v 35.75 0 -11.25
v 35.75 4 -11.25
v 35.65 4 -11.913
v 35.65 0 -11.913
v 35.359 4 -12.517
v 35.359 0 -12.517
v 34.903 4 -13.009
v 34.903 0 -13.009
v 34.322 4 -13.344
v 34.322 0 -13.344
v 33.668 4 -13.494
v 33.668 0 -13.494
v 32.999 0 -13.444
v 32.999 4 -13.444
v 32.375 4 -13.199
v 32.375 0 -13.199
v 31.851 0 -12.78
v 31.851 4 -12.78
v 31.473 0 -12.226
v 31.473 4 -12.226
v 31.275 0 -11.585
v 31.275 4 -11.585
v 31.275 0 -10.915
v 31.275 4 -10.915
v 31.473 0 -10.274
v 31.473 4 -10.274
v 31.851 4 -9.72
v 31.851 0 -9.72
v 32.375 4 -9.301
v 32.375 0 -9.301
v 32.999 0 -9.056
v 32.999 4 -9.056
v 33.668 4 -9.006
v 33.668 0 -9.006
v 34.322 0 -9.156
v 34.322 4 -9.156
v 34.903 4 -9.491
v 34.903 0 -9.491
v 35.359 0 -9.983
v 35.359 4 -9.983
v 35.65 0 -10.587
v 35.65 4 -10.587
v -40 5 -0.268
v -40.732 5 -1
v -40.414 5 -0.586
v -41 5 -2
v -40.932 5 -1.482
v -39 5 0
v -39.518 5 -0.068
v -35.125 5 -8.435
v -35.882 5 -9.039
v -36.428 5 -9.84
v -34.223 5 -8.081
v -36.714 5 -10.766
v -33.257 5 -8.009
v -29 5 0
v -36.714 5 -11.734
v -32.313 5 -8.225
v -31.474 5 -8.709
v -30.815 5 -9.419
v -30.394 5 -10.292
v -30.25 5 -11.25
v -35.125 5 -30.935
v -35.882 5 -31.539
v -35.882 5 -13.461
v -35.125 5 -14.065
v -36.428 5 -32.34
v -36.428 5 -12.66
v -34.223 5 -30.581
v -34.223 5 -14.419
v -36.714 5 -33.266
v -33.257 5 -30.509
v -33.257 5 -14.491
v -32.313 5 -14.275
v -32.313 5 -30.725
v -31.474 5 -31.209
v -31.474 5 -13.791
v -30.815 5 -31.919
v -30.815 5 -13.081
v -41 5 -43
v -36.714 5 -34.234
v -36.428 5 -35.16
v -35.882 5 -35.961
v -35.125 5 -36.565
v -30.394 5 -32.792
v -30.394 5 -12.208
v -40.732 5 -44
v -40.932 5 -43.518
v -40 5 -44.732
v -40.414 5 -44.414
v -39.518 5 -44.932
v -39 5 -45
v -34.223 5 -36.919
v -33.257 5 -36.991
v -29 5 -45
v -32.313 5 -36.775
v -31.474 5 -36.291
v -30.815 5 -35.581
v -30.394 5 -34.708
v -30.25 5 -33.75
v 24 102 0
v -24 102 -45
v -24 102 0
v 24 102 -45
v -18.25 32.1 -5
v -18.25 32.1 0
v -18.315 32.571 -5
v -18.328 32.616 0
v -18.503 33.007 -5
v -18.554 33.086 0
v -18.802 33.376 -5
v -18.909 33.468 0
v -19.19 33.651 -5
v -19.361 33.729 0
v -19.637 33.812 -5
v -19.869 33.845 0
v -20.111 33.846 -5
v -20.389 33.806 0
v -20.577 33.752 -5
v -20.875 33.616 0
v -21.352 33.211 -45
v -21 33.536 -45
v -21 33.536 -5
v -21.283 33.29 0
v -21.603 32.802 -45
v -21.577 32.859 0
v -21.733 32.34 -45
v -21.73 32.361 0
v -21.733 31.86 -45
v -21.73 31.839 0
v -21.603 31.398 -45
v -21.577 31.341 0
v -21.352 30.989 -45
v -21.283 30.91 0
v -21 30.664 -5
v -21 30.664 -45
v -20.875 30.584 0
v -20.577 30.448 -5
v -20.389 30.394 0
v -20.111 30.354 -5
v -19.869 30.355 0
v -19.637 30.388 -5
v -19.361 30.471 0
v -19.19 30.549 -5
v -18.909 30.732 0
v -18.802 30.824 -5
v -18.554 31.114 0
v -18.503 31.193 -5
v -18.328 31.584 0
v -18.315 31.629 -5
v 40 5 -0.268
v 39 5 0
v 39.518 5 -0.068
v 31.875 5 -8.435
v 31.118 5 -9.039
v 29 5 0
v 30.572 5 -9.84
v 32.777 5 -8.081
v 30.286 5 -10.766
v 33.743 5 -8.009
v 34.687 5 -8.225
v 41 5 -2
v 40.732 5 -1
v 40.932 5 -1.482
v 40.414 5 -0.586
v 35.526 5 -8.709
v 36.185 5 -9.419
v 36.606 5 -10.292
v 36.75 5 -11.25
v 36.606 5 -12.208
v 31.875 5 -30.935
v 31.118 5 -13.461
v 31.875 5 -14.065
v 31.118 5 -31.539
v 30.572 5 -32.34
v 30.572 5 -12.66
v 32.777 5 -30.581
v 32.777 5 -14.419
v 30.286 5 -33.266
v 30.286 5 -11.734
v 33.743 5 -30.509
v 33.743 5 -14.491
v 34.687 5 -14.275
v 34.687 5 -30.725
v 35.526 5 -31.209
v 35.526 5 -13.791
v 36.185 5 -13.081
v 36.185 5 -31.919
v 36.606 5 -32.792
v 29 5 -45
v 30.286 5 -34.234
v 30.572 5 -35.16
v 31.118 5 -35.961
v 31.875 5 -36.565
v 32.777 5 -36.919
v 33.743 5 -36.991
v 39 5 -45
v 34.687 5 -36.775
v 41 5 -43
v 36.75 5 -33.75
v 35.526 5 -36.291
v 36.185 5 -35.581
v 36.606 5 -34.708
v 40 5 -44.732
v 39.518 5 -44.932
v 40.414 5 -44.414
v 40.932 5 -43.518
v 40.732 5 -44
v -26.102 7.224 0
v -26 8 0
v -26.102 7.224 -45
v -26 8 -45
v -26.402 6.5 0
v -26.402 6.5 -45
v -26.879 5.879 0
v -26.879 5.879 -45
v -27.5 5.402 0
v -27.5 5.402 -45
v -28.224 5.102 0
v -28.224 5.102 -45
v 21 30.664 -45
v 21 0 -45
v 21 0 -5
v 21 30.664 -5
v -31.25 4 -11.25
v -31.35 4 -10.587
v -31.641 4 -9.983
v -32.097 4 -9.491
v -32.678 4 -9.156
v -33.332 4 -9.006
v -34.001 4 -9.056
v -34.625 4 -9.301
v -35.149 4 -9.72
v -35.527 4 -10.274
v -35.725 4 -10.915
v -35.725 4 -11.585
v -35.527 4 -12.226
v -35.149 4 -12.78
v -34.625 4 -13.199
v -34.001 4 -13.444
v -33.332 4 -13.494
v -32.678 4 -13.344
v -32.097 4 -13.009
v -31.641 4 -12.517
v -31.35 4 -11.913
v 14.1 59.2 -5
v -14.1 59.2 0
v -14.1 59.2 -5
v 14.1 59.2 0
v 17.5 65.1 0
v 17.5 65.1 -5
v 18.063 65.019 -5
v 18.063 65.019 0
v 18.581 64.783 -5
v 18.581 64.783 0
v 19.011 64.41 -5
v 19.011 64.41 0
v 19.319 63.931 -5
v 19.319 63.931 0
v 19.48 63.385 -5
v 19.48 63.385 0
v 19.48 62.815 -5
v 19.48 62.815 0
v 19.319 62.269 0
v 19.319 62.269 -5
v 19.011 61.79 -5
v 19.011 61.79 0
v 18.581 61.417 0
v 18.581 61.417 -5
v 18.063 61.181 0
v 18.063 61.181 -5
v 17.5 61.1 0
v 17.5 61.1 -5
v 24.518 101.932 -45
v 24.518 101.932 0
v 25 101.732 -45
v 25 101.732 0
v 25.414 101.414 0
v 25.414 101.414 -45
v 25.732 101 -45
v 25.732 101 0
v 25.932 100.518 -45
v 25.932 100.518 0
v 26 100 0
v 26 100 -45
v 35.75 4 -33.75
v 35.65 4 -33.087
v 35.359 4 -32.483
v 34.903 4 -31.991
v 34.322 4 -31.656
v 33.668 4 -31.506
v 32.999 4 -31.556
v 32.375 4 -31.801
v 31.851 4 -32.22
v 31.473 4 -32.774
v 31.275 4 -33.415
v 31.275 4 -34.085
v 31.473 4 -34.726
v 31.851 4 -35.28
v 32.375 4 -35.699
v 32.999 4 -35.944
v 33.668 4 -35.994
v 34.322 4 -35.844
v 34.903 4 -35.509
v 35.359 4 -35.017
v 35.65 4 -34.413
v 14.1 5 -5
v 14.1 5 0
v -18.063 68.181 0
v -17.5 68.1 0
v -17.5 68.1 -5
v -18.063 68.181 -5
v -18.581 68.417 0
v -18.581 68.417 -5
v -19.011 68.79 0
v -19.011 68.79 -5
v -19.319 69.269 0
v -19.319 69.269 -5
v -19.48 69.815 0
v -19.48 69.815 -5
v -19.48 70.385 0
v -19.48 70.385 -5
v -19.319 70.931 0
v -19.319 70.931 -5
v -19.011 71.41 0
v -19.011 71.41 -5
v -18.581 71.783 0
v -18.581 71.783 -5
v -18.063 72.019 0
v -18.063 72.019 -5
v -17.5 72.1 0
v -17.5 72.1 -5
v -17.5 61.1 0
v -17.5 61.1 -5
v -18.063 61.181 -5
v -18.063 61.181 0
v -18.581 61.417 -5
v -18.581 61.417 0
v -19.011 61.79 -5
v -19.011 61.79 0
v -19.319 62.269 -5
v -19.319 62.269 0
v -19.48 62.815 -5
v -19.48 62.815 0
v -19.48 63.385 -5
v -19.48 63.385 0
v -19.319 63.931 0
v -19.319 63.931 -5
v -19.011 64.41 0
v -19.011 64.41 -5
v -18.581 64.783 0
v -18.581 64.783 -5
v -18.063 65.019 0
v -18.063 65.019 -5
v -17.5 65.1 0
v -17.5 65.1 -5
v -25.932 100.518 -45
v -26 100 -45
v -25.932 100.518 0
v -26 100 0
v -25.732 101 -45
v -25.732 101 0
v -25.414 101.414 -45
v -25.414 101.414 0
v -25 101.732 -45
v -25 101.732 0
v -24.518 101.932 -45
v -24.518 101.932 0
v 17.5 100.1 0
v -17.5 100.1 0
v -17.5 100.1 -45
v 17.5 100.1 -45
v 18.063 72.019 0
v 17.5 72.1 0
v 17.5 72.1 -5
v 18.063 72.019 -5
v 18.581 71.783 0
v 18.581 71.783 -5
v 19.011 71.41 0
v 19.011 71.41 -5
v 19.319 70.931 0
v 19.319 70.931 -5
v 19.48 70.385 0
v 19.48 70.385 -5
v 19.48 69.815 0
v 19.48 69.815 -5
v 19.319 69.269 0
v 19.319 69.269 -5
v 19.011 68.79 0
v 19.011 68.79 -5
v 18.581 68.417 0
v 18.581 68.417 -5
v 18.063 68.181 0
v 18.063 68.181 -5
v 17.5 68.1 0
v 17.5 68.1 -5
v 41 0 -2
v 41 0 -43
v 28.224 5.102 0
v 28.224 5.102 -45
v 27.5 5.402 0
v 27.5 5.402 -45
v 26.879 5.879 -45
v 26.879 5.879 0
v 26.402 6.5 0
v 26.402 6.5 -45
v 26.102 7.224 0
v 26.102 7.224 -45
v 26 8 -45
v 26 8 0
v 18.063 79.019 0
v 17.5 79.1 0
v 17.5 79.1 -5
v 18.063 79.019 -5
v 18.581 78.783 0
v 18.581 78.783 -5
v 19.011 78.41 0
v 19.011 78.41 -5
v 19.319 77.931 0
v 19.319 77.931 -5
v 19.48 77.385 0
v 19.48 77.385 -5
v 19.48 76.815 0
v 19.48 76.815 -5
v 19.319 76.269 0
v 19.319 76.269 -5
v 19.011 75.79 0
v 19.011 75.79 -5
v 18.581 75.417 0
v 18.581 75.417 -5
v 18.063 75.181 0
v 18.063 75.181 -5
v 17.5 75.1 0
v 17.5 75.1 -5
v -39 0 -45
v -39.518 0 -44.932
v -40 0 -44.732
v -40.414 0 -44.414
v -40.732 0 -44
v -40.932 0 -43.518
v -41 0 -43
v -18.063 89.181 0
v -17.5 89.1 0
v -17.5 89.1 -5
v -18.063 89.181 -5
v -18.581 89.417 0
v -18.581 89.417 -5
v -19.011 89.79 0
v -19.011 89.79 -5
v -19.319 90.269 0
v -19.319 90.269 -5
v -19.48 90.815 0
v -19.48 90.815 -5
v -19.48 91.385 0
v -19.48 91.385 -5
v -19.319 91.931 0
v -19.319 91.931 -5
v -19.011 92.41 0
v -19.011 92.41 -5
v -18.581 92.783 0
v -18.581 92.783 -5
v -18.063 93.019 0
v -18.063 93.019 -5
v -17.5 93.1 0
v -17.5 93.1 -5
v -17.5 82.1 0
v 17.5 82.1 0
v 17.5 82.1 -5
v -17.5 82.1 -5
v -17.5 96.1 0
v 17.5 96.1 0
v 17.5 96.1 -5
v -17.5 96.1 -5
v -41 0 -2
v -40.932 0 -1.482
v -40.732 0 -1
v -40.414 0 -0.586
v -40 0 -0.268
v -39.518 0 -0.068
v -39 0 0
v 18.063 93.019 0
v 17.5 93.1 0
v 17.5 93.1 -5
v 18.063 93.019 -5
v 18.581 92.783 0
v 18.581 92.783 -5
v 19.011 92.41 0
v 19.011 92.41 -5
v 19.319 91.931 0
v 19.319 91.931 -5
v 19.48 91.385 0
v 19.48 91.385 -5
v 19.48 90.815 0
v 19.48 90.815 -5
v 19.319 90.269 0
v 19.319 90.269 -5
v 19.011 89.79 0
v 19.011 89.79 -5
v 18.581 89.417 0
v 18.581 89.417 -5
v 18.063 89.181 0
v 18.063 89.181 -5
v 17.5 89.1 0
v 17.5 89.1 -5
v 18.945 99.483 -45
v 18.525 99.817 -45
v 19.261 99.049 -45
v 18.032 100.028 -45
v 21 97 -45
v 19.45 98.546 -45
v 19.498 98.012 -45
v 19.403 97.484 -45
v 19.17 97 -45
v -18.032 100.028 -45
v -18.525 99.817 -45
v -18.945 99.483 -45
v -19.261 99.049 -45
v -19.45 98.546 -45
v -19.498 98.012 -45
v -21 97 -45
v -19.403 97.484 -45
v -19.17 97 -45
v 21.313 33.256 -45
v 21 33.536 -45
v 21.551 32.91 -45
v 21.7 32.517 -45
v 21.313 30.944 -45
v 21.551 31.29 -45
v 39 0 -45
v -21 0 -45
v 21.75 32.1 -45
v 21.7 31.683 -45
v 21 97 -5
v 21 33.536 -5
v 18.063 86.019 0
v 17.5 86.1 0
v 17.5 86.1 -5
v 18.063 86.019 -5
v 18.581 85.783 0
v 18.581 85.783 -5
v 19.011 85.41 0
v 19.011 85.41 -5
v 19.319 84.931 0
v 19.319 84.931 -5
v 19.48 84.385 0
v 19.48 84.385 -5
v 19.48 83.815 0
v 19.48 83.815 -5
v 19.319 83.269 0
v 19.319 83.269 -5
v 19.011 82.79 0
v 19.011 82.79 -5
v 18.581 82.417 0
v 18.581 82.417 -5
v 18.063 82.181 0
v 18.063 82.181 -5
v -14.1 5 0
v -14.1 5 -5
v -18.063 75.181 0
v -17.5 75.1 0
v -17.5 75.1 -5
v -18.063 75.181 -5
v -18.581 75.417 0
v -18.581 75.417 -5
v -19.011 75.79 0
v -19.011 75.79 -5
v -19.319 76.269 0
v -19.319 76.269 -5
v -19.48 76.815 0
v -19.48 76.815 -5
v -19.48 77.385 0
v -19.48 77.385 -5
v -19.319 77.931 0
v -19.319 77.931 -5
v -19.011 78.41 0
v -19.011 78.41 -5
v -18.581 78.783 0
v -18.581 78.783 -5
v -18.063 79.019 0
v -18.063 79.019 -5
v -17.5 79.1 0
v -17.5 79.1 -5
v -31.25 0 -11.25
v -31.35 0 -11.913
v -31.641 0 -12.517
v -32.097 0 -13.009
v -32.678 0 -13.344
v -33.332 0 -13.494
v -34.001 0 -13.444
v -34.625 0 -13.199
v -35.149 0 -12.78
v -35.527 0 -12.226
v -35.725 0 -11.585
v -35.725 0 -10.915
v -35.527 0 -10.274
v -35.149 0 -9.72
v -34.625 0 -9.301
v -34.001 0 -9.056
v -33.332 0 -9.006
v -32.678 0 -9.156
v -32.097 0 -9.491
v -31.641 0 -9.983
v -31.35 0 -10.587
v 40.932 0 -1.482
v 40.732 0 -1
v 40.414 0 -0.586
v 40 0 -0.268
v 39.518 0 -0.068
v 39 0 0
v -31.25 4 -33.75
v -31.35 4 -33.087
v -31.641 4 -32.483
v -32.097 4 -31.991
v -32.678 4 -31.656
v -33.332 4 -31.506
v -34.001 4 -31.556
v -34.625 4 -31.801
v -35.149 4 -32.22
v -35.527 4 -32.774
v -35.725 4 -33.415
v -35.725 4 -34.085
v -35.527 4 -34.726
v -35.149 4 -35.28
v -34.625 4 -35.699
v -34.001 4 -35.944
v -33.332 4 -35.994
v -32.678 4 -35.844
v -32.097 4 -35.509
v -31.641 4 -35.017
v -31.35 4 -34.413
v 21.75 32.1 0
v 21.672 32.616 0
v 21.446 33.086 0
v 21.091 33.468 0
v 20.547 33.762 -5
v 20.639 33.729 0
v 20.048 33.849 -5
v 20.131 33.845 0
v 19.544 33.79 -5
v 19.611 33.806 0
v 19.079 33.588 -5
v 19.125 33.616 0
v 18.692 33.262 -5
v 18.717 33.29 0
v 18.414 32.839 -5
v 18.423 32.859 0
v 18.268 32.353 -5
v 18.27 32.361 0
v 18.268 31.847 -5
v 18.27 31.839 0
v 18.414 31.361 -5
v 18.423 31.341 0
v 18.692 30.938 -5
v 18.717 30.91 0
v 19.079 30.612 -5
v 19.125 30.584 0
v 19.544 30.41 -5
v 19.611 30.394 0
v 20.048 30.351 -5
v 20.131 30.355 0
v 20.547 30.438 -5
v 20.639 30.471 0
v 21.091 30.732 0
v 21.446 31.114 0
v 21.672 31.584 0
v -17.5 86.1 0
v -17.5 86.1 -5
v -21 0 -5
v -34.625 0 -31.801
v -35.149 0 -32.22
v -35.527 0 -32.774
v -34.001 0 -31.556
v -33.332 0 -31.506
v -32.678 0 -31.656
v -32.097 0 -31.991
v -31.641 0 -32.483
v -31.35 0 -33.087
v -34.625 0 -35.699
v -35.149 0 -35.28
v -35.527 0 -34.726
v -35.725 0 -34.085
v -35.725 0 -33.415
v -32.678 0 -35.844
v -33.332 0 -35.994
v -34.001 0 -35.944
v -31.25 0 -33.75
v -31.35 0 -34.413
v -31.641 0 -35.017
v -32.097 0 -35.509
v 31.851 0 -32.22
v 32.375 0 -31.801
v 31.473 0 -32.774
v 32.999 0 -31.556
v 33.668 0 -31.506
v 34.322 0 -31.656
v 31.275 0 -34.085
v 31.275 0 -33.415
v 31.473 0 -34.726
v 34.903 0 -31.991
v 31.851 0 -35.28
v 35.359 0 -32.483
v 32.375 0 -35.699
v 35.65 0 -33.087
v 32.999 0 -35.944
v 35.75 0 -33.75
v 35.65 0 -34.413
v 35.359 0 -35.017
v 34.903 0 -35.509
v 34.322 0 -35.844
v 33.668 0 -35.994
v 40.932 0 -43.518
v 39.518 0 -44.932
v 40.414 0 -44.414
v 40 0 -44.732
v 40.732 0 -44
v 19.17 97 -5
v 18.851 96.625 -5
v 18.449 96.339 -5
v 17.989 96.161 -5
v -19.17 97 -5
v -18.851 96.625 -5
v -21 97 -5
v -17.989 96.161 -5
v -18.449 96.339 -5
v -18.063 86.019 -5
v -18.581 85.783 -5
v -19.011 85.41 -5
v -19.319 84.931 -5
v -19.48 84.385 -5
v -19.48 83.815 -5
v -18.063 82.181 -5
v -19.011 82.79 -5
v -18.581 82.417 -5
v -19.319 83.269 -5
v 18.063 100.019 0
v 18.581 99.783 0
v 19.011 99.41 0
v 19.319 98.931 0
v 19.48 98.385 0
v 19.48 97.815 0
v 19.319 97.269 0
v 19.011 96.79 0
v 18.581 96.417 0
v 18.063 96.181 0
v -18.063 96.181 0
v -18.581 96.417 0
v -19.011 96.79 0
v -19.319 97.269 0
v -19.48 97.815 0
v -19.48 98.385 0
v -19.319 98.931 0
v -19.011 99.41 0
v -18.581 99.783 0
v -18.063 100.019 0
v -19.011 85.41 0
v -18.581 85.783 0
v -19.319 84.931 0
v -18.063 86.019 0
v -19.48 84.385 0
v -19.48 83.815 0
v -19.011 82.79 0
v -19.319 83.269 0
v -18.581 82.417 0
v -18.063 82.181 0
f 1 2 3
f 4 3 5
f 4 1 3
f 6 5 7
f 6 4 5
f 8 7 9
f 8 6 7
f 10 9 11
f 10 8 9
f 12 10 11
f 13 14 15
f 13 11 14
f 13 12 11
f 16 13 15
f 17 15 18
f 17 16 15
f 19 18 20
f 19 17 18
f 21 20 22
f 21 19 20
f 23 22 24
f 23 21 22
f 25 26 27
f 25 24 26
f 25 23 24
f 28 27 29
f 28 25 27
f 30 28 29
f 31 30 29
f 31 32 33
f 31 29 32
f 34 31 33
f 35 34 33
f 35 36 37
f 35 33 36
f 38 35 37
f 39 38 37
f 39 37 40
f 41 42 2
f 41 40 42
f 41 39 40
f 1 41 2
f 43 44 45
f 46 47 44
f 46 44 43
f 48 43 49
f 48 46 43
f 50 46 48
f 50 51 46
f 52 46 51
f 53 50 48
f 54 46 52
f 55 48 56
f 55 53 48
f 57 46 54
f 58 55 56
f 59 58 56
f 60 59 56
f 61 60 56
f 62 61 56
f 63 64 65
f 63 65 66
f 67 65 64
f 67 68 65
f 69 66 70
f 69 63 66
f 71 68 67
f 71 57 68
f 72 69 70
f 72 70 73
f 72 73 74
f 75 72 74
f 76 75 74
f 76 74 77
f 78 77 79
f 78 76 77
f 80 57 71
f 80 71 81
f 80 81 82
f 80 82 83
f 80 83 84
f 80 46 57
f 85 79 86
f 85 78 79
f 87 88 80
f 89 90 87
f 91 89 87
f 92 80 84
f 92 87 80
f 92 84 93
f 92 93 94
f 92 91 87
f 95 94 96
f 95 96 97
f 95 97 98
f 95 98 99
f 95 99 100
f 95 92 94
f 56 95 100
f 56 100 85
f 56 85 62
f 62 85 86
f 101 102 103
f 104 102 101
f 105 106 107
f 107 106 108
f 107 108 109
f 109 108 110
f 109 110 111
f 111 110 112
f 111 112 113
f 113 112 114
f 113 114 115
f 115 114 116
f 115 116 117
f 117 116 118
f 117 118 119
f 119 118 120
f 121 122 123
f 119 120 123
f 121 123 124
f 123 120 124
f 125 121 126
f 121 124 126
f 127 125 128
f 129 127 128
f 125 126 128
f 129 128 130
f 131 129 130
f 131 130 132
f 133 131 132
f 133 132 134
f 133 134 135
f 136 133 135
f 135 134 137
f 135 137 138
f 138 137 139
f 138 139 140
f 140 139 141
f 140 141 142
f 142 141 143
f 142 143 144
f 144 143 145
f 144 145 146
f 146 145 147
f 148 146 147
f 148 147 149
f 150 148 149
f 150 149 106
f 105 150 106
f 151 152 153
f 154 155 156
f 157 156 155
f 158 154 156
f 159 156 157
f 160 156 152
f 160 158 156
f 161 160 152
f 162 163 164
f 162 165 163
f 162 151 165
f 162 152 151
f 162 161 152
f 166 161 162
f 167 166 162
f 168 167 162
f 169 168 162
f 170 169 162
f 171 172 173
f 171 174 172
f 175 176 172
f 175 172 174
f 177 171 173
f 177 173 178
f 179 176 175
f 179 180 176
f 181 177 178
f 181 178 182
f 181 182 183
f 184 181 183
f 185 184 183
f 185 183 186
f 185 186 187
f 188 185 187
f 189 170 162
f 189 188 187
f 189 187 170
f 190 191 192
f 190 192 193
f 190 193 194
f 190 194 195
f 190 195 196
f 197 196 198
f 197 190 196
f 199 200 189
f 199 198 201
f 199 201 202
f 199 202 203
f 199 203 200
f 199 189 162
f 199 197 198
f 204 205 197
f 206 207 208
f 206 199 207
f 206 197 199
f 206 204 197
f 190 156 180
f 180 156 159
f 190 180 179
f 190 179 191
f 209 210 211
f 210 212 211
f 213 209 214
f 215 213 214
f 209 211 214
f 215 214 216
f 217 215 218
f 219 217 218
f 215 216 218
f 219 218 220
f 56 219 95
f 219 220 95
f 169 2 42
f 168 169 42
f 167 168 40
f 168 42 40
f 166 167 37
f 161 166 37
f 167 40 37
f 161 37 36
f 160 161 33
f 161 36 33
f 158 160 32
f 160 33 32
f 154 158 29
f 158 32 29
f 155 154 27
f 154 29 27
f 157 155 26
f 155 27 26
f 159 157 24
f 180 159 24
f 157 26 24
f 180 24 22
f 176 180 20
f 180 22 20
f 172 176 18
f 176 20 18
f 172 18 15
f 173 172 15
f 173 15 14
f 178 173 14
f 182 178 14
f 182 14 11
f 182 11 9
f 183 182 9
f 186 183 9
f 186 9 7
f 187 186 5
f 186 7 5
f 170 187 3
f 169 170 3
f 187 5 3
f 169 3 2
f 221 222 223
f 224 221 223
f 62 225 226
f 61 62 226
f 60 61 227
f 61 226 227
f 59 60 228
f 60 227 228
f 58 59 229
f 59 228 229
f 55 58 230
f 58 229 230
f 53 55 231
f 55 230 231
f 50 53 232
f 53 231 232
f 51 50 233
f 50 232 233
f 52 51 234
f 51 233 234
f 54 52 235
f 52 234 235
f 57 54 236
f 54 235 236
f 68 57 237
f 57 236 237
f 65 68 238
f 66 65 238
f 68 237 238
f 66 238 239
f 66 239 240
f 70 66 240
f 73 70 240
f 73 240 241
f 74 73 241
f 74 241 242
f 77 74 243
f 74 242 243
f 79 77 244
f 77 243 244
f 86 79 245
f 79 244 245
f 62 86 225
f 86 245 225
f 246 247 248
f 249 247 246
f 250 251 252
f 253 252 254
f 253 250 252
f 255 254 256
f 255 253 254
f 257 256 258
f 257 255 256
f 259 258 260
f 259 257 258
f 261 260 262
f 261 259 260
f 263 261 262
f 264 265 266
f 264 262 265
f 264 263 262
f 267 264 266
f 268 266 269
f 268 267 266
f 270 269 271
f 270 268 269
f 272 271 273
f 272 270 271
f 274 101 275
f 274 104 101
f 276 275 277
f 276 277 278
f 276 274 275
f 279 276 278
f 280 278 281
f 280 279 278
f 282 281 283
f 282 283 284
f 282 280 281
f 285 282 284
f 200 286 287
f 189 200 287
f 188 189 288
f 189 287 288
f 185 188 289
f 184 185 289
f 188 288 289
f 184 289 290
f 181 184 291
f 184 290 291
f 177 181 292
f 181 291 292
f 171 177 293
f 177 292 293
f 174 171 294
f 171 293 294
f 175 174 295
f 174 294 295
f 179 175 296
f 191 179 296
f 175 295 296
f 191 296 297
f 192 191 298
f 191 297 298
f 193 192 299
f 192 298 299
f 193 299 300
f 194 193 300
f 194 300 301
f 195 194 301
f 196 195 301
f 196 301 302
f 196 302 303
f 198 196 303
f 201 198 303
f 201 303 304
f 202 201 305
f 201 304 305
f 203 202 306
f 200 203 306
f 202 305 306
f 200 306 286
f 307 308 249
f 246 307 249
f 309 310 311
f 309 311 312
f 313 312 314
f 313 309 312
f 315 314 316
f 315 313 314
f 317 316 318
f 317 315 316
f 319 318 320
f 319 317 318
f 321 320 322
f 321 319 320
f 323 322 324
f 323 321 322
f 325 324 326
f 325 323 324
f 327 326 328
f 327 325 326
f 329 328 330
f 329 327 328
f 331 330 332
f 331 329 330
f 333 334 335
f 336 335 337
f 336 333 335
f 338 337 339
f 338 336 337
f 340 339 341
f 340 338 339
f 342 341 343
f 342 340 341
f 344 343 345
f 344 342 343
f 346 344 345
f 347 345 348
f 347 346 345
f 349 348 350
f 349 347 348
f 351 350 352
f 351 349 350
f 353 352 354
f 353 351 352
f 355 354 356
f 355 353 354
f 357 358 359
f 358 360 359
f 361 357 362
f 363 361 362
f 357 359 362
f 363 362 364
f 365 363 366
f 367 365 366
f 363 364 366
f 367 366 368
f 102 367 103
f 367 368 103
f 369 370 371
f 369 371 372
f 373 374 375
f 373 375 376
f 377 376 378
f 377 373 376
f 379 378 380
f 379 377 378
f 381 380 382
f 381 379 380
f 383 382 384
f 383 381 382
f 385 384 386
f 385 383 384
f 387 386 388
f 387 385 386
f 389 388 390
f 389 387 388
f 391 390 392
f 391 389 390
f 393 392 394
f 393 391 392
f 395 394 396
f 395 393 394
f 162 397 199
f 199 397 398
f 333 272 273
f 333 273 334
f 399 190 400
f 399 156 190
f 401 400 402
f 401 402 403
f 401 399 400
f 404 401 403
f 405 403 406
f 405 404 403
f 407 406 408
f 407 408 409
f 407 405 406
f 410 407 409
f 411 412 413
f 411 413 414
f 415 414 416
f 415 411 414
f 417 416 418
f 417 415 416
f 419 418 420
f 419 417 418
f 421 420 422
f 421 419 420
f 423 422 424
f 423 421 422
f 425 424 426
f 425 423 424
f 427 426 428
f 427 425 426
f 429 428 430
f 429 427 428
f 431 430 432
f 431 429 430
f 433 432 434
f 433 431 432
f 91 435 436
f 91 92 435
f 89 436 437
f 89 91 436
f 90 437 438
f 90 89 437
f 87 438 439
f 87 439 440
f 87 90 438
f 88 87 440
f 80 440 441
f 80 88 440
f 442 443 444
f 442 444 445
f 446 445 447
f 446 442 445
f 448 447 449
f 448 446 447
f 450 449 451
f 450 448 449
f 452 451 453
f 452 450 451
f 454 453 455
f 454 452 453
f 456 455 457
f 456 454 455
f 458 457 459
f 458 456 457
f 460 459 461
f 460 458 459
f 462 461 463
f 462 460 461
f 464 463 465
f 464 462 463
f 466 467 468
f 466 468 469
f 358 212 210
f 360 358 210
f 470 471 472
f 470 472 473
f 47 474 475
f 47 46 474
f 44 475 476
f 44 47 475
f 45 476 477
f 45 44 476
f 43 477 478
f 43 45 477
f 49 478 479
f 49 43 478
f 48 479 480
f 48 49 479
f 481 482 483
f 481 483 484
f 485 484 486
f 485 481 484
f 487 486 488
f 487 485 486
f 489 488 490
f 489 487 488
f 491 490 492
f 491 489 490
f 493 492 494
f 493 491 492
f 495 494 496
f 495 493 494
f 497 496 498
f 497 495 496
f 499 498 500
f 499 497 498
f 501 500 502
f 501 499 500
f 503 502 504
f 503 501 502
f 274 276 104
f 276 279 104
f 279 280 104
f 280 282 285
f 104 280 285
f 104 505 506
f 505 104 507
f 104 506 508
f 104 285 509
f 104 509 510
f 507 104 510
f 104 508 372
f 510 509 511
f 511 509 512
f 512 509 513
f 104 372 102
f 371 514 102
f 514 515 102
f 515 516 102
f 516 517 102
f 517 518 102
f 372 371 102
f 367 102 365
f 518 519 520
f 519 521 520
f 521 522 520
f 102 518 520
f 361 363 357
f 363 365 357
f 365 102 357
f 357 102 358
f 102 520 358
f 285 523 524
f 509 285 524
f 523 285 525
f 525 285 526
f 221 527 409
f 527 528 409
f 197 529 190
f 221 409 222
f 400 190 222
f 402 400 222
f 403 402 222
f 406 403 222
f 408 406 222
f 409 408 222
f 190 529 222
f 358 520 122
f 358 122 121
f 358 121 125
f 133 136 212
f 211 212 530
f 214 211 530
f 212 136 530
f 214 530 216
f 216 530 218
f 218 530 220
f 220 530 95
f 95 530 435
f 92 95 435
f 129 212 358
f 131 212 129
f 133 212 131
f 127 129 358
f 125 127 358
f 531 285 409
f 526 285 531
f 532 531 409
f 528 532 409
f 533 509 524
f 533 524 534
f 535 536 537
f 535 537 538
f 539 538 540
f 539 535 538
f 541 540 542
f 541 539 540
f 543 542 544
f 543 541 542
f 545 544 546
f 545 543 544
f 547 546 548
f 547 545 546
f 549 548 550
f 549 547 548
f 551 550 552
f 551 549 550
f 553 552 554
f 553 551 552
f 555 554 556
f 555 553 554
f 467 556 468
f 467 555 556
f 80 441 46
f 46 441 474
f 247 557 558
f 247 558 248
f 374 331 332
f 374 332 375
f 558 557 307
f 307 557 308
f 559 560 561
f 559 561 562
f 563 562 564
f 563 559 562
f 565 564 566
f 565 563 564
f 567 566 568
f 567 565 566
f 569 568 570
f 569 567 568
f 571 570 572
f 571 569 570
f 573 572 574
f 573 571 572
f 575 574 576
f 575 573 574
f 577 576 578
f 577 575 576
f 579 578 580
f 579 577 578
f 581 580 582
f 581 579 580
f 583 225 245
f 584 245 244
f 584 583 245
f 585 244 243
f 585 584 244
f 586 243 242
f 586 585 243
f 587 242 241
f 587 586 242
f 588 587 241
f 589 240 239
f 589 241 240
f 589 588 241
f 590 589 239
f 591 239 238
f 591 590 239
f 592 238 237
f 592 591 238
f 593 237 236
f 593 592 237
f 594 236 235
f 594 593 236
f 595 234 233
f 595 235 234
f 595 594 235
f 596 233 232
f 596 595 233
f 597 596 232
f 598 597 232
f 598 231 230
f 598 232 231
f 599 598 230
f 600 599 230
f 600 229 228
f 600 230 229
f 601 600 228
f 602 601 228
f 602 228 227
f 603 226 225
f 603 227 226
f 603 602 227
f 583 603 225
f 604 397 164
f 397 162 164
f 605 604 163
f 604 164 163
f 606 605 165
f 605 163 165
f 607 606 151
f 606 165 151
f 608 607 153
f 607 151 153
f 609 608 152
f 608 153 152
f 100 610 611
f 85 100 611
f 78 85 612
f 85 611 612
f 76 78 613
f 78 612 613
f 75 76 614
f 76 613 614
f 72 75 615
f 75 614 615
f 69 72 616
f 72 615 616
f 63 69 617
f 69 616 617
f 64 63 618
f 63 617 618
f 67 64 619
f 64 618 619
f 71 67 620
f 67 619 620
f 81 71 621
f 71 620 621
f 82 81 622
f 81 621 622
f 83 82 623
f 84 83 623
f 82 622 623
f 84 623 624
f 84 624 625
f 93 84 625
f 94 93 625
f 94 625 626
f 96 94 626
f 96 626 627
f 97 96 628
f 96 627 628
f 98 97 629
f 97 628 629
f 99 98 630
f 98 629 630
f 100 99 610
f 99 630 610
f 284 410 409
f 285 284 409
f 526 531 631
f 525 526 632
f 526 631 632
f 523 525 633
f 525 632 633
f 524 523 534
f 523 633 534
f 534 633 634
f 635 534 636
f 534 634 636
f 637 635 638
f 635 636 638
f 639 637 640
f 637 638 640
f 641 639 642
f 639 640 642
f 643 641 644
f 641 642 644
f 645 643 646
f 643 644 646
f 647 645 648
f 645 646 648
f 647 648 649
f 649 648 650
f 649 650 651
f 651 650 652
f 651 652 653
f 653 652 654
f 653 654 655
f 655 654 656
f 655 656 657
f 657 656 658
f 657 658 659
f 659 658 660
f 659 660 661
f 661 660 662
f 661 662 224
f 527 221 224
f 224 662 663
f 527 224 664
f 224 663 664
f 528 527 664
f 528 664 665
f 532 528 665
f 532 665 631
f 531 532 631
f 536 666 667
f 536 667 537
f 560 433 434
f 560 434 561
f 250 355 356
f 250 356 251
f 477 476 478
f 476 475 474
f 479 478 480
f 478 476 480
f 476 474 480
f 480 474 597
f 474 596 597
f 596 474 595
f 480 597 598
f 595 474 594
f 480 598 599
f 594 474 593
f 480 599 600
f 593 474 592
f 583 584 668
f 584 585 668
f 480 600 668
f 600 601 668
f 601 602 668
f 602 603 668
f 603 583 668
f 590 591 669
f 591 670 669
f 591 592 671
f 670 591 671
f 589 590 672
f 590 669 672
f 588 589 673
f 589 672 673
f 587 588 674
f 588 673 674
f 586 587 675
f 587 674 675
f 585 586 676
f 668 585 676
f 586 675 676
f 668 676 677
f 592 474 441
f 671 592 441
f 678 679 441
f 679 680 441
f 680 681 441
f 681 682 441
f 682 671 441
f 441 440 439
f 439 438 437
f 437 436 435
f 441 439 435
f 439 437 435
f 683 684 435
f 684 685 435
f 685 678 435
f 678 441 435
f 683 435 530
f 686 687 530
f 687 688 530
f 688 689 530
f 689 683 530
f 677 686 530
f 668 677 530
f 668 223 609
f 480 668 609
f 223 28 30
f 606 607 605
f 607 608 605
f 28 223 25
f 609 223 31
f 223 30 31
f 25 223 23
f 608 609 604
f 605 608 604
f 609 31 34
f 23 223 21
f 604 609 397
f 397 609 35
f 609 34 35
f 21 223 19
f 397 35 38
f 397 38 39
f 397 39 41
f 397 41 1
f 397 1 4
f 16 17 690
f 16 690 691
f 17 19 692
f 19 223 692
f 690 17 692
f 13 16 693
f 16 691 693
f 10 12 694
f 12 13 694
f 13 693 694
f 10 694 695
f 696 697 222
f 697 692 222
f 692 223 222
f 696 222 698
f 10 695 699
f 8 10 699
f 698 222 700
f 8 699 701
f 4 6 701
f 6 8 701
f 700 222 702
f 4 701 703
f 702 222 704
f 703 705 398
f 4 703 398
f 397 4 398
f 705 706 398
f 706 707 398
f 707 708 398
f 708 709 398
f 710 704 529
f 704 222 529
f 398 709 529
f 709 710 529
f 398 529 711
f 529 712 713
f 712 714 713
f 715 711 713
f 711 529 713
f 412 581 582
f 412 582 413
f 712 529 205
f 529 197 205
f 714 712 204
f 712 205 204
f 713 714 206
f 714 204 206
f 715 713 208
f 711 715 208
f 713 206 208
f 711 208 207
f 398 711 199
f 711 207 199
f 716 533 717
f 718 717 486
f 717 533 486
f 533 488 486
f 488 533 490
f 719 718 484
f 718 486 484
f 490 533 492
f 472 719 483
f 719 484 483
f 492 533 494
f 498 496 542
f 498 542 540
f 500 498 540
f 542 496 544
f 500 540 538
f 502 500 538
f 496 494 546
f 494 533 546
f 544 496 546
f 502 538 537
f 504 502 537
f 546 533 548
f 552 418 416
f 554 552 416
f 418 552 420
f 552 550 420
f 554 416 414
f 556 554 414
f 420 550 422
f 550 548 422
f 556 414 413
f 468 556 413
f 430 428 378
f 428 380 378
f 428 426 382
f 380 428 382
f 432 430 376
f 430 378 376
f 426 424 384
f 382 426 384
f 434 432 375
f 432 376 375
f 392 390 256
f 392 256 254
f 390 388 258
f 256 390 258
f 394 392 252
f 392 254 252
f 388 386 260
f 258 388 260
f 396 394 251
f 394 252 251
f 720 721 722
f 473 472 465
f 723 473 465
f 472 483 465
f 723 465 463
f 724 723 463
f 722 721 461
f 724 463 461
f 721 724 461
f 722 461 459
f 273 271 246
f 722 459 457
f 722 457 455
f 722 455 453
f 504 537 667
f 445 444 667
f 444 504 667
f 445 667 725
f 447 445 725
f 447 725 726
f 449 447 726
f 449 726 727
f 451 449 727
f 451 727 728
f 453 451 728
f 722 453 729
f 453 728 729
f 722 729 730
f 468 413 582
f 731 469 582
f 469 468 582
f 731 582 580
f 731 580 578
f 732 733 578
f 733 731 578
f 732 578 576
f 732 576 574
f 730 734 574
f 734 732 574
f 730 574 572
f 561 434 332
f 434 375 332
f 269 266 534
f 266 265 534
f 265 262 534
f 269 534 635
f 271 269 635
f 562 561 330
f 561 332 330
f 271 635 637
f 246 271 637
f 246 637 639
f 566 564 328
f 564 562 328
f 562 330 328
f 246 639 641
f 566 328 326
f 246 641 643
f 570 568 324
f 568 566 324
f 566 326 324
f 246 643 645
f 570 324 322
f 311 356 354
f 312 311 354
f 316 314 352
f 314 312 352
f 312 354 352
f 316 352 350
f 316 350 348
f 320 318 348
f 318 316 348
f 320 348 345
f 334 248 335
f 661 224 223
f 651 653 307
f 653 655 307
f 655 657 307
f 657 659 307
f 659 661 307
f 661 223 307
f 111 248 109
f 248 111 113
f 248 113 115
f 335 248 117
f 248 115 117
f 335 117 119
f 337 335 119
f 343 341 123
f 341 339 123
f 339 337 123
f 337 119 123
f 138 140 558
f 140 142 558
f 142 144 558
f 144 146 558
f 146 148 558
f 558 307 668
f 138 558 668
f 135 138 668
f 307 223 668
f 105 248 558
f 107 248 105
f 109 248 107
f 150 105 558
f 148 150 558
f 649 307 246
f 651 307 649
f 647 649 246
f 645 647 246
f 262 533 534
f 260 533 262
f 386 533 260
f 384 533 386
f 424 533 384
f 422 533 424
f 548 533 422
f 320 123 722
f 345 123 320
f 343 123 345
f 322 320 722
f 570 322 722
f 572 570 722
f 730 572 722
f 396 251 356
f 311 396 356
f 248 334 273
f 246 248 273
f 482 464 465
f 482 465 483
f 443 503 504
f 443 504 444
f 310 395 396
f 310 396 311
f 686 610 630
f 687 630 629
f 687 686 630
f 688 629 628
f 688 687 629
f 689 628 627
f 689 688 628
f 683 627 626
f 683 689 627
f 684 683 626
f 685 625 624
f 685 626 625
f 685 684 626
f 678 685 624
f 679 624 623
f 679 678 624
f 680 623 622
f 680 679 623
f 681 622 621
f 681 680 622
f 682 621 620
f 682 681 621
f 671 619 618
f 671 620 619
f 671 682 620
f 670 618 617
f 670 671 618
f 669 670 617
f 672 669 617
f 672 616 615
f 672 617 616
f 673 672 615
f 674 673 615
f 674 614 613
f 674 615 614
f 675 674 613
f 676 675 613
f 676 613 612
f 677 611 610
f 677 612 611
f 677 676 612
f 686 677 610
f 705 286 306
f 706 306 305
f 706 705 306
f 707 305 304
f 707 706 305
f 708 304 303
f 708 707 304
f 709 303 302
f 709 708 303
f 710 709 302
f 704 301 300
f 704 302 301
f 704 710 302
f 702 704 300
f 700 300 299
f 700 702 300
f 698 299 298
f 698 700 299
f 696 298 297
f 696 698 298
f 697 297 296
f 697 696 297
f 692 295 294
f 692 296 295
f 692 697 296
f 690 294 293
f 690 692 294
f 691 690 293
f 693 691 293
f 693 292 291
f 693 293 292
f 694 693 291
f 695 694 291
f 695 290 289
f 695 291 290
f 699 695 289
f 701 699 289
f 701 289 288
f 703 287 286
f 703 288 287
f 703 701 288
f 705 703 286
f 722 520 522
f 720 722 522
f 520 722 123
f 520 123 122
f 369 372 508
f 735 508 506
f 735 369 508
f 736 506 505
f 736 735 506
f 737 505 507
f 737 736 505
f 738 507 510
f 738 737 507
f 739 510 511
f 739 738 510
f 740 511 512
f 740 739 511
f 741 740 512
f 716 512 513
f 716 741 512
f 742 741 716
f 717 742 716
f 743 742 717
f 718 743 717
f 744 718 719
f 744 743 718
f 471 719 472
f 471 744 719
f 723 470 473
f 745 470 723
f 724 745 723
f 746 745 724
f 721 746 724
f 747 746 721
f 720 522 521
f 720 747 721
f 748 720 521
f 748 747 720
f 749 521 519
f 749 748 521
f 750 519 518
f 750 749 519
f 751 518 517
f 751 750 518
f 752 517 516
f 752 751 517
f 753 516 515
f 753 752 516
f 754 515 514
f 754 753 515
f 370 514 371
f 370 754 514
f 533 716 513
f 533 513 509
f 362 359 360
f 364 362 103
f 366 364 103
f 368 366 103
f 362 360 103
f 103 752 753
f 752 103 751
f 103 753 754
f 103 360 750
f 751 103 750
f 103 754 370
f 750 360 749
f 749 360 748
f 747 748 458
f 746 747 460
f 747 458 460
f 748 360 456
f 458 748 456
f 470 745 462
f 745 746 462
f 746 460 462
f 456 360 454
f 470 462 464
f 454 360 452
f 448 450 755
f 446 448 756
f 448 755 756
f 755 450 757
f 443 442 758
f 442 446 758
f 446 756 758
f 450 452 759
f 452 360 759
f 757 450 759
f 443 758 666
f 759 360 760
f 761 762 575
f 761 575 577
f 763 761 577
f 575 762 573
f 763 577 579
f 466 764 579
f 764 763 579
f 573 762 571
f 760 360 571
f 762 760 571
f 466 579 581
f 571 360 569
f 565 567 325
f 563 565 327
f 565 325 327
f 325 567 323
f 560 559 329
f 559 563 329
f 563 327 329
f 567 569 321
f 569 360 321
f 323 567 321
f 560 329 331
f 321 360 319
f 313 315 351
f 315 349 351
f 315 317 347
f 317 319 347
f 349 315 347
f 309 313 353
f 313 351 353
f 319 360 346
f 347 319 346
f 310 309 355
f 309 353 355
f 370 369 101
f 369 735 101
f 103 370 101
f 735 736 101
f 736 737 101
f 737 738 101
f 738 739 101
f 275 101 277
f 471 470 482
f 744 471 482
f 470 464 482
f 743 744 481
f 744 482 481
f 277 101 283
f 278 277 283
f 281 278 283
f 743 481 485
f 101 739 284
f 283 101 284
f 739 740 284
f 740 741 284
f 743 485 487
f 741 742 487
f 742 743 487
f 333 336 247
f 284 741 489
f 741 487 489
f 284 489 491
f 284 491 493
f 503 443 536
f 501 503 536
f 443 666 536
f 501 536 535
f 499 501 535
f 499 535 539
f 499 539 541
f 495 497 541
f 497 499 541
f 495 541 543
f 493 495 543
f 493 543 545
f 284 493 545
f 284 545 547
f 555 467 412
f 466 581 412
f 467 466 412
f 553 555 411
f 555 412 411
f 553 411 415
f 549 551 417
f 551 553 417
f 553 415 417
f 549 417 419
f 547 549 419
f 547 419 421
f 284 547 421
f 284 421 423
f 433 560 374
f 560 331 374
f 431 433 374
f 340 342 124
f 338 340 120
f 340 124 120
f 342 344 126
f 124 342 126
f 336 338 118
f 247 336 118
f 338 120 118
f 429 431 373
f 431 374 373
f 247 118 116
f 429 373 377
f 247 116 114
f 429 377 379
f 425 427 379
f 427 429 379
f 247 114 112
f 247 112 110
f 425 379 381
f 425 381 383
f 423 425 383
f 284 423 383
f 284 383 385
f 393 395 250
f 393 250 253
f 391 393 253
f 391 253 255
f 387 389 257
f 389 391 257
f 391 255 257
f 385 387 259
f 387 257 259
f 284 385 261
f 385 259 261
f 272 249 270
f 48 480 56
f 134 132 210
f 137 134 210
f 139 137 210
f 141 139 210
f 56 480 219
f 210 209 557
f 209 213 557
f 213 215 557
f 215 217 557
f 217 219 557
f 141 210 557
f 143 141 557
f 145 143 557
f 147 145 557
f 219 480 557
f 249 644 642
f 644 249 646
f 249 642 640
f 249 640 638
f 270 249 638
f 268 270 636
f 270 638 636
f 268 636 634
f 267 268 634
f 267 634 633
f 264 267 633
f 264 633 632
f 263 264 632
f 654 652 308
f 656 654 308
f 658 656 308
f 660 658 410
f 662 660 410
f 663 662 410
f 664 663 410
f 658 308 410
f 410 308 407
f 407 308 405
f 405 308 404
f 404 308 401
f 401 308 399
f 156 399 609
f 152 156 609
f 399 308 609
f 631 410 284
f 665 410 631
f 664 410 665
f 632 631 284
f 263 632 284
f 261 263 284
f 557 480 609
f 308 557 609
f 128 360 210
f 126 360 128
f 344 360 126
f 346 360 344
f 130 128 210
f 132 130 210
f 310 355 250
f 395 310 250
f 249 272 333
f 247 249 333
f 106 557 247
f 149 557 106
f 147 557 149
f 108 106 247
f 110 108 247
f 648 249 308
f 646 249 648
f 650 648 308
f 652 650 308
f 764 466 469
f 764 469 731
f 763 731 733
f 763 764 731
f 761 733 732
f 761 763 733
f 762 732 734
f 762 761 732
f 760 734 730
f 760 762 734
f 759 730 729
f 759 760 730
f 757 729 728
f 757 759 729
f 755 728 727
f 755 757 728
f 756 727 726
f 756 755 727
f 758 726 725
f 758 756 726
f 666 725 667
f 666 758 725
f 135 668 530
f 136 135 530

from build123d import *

# Parameters (mm, degrees)
RESSALTO_EXTRUS_O4_DEPTH = 5
RESSALTO_EXTRUS_O6_DEPTH = 102
ESBO_O9_W                = 52
ESBO_O9_H                = 5
RESSALTO_EXTRUS_O7_DEPTH = 45
ESBO_O10_R               = 2.25
CORTE_EXTRUS_O1_DEPTH    = 103
FILETE1_R                = 3
FILETE3_R                = 2
FILETE5_R                = 2
ESBO_O11_R               = 1.75
ESBO_O11_W               = 28.2
ESBO_O11_H               = 54.2
CORTE_EXTRUS_O2_DEPTH    = 46
CORTE_EXTRUS_O3_DEPTH    = 46
CHANFRO1_SIZE            = 1


with BuildPart() as part:
    # Esboço7 → Ressalto-extrusão4 (new body)
    with BuildSketch(Plane(origin=(0, 0, 0), x_dir=(1, 0, 0), z_dir=(0, 1, 0))):
        Polygon((21, 45), (21, 5), (-21, 5), (-21, 45), (-41, 45), (-41, 0), (41, 0), (41, 45), align=None)
    extrude(amount=RESSALTO_EXTRUS_O4_DEPTH)

    # Esboço8 → Ressalto-extrusão6 (add)
    with BuildSketch(Plane(origin=(0, 0, 0), x_dir=(1, 0, 0), z_dir=(0, 1, 0))):
        Polygon((-21, 45), (-26, 45), (-26, 0), (26, 0), (26, 45), (21, 45), (21, 5), (-21, 5), align=None)
    extrude(amount=RESSALTO_EXTRUS_O6_DEPTH)

    # Esboço9 → Ressalto-extrusão7 (add)
    with BuildSketch(Plane.XY):
        with Locations((0, 99.5)):
            Rectangle(ESBO_O9_W, ESBO_O9_H)
    extrude(amount=-RESSALTO_EXTRUS_O7_DEPTH)

    # Esboço10 → Corte-extrusão1 (cut, through all)
    with BuildSketch(Plane(origin=(0, 0, 0), x_dir=(1, 0, 0), z_dir=(0, 1, 0))):
        with Locations((-33.5, 33.75)):
            Circle(ESBO_O10_R)
        with Locations((-33.5, 11.25)):
            Circle(ESBO_O10_R)
        with Locations((33.5, 11.25)):
            Circle(ESBO_O10_R)
        with Locations((33.5, 33.75)):
            Circle(ESBO_O10_R)
    extrude(amount=CORTE_EXTRUS_O1_DEPTH, mode=Mode.SUBTRACT)

    # Filete1
    filete1_edges = [part.edges().sort_by_distance(p)[0] for p in [
        (-26, 5, -22.5),
        (26, 5, -22.5),
    ]]
    fillet(filete1_edges, radius=FILETE1_R)

    # Filete3
    filete3_edges = [part.edges().sort_by_distance(p)[0] for p in [
        (41, 2.5, 0),
        (-41, 2.5, 0),
        (-41, 2.5, -45),
        (41, 2.5, -45),
    ]]
    fillet(filete3_edges, radius=FILETE3_R)

    # Filete5
    filete5_edges = [part.edges().sort_by_distance(p)[0] for p in [
        (-26, 102, -22.5),
        (26, 102, -22.5),
    ]]
    fillet(filete5_edges, radius=FILETE5_R)

    # Esboço11 → Corte-extrusão2 (cut, through all)
    with BuildSketch(Plane.XY):
        with Locations((20, 32.1)):
            Circle(ESBO_O11_R)
        with Locations((-20, 32.1)):
            Circle(ESBO_O11_R)
        with Locations((0, 32.1)):
            Rectangle(ESBO_O11_W, ESBO_O11_H)
    extrude(amount=-CORTE_EXTRUS_O2_DEPTH, mode=Mode.SUBTRACT)

    # Esboço12 → Corte-extrusão3 (cut, through all)
    with BuildSketch(Plane.XY):
        with BuildLine():
            Line((-17.5, 100.1), (17.5, 100.1))
            ThreePointArc((17.5, 100.1), (19.5, 98.1), (17.5, 96.1))
            Line((17.5, 96.1), (-17.5, 96.1))
            ThreePointArc((-17.5, 96.1), (-19.5, 98.1), (-17.5, 100.1))
        make_face()
        with BuildLine():
            Line((-17.5, 93.1), (17.5, 93.1))
            ThreePointArc((17.5, 93.1), (19.5, 91.1), (17.5, 89.1))
            Line((17.5, 89.1), (-17.5, 89.1))
            ThreePointArc((-17.5, 89.1), (-19.5, 91.1), (-17.5, 93.1))
        make_face()
        with BuildLine():
            Line((-17.5, 86.1), (17.5, 86.1))
            ThreePointArc((17.5, 86.1), (19.5, 84.1), (17.5, 82.1))
            Line((17.5, 82.1), (-17.5, 82.1))
            ThreePointArc((-17.5, 82.1), (-19.5, 84.1), (-17.5, 86.1))
        make_face()
        with BuildLine():
            Line((-17.5, 79.1), (17.5, 79.1))
            ThreePointArc((17.5, 79.1), (19.5, 77.1), (17.5, 75.1))
            Line((17.5, 75.1), (-17.5, 75.1))
            ThreePointArc((-17.5, 75.1), (-19.5, 77.1), (-17.5, 79.1))
        make_face()
        with BuildLine():
            Line((-17.5, 72.1), (17.5, 72.1))
            ThreePointArc((17.5, 72.1), (19.5, 70.1), (17.5, 68.1))
            Line((17.5, 68.1), (-17.5, 68.1))
            ThreePointArc((-17.5, 68.1), (-19.5, 70.1), (-17.5, 72.1))
        make_face()
        with BuildLine():
            Line((-17.5, 65.1), (17.5, 65.1))
            ThreePointArc((17.5, 65.1), (19.5, 63.1), (17.5, 61.1))
            Line((17.5, 61.1), (-17.5, 61.1))
            ThreePointArc((-17.5, 61.1), (-19.5, 63.1), (-17.5, 65.1))
        make_face()
    extrude(amount=-CORTE_EXTRUS_O3_DEPTH, mode=Mode.SUBTRACT)

    # Chanfro1
    chanfro1_edges = [part.edges().sort_by_distance(p)[0] for p in [
        (31.25, 5, -33.75),
        (31.25, 5, -11.25),
        (-35.75, 5, -11.25),
        (-35.75, 5, -33.75),
    ]]
    chamfer(chanfro1_edges, length=CHANFRO1_SIZE)


solid = part.part
